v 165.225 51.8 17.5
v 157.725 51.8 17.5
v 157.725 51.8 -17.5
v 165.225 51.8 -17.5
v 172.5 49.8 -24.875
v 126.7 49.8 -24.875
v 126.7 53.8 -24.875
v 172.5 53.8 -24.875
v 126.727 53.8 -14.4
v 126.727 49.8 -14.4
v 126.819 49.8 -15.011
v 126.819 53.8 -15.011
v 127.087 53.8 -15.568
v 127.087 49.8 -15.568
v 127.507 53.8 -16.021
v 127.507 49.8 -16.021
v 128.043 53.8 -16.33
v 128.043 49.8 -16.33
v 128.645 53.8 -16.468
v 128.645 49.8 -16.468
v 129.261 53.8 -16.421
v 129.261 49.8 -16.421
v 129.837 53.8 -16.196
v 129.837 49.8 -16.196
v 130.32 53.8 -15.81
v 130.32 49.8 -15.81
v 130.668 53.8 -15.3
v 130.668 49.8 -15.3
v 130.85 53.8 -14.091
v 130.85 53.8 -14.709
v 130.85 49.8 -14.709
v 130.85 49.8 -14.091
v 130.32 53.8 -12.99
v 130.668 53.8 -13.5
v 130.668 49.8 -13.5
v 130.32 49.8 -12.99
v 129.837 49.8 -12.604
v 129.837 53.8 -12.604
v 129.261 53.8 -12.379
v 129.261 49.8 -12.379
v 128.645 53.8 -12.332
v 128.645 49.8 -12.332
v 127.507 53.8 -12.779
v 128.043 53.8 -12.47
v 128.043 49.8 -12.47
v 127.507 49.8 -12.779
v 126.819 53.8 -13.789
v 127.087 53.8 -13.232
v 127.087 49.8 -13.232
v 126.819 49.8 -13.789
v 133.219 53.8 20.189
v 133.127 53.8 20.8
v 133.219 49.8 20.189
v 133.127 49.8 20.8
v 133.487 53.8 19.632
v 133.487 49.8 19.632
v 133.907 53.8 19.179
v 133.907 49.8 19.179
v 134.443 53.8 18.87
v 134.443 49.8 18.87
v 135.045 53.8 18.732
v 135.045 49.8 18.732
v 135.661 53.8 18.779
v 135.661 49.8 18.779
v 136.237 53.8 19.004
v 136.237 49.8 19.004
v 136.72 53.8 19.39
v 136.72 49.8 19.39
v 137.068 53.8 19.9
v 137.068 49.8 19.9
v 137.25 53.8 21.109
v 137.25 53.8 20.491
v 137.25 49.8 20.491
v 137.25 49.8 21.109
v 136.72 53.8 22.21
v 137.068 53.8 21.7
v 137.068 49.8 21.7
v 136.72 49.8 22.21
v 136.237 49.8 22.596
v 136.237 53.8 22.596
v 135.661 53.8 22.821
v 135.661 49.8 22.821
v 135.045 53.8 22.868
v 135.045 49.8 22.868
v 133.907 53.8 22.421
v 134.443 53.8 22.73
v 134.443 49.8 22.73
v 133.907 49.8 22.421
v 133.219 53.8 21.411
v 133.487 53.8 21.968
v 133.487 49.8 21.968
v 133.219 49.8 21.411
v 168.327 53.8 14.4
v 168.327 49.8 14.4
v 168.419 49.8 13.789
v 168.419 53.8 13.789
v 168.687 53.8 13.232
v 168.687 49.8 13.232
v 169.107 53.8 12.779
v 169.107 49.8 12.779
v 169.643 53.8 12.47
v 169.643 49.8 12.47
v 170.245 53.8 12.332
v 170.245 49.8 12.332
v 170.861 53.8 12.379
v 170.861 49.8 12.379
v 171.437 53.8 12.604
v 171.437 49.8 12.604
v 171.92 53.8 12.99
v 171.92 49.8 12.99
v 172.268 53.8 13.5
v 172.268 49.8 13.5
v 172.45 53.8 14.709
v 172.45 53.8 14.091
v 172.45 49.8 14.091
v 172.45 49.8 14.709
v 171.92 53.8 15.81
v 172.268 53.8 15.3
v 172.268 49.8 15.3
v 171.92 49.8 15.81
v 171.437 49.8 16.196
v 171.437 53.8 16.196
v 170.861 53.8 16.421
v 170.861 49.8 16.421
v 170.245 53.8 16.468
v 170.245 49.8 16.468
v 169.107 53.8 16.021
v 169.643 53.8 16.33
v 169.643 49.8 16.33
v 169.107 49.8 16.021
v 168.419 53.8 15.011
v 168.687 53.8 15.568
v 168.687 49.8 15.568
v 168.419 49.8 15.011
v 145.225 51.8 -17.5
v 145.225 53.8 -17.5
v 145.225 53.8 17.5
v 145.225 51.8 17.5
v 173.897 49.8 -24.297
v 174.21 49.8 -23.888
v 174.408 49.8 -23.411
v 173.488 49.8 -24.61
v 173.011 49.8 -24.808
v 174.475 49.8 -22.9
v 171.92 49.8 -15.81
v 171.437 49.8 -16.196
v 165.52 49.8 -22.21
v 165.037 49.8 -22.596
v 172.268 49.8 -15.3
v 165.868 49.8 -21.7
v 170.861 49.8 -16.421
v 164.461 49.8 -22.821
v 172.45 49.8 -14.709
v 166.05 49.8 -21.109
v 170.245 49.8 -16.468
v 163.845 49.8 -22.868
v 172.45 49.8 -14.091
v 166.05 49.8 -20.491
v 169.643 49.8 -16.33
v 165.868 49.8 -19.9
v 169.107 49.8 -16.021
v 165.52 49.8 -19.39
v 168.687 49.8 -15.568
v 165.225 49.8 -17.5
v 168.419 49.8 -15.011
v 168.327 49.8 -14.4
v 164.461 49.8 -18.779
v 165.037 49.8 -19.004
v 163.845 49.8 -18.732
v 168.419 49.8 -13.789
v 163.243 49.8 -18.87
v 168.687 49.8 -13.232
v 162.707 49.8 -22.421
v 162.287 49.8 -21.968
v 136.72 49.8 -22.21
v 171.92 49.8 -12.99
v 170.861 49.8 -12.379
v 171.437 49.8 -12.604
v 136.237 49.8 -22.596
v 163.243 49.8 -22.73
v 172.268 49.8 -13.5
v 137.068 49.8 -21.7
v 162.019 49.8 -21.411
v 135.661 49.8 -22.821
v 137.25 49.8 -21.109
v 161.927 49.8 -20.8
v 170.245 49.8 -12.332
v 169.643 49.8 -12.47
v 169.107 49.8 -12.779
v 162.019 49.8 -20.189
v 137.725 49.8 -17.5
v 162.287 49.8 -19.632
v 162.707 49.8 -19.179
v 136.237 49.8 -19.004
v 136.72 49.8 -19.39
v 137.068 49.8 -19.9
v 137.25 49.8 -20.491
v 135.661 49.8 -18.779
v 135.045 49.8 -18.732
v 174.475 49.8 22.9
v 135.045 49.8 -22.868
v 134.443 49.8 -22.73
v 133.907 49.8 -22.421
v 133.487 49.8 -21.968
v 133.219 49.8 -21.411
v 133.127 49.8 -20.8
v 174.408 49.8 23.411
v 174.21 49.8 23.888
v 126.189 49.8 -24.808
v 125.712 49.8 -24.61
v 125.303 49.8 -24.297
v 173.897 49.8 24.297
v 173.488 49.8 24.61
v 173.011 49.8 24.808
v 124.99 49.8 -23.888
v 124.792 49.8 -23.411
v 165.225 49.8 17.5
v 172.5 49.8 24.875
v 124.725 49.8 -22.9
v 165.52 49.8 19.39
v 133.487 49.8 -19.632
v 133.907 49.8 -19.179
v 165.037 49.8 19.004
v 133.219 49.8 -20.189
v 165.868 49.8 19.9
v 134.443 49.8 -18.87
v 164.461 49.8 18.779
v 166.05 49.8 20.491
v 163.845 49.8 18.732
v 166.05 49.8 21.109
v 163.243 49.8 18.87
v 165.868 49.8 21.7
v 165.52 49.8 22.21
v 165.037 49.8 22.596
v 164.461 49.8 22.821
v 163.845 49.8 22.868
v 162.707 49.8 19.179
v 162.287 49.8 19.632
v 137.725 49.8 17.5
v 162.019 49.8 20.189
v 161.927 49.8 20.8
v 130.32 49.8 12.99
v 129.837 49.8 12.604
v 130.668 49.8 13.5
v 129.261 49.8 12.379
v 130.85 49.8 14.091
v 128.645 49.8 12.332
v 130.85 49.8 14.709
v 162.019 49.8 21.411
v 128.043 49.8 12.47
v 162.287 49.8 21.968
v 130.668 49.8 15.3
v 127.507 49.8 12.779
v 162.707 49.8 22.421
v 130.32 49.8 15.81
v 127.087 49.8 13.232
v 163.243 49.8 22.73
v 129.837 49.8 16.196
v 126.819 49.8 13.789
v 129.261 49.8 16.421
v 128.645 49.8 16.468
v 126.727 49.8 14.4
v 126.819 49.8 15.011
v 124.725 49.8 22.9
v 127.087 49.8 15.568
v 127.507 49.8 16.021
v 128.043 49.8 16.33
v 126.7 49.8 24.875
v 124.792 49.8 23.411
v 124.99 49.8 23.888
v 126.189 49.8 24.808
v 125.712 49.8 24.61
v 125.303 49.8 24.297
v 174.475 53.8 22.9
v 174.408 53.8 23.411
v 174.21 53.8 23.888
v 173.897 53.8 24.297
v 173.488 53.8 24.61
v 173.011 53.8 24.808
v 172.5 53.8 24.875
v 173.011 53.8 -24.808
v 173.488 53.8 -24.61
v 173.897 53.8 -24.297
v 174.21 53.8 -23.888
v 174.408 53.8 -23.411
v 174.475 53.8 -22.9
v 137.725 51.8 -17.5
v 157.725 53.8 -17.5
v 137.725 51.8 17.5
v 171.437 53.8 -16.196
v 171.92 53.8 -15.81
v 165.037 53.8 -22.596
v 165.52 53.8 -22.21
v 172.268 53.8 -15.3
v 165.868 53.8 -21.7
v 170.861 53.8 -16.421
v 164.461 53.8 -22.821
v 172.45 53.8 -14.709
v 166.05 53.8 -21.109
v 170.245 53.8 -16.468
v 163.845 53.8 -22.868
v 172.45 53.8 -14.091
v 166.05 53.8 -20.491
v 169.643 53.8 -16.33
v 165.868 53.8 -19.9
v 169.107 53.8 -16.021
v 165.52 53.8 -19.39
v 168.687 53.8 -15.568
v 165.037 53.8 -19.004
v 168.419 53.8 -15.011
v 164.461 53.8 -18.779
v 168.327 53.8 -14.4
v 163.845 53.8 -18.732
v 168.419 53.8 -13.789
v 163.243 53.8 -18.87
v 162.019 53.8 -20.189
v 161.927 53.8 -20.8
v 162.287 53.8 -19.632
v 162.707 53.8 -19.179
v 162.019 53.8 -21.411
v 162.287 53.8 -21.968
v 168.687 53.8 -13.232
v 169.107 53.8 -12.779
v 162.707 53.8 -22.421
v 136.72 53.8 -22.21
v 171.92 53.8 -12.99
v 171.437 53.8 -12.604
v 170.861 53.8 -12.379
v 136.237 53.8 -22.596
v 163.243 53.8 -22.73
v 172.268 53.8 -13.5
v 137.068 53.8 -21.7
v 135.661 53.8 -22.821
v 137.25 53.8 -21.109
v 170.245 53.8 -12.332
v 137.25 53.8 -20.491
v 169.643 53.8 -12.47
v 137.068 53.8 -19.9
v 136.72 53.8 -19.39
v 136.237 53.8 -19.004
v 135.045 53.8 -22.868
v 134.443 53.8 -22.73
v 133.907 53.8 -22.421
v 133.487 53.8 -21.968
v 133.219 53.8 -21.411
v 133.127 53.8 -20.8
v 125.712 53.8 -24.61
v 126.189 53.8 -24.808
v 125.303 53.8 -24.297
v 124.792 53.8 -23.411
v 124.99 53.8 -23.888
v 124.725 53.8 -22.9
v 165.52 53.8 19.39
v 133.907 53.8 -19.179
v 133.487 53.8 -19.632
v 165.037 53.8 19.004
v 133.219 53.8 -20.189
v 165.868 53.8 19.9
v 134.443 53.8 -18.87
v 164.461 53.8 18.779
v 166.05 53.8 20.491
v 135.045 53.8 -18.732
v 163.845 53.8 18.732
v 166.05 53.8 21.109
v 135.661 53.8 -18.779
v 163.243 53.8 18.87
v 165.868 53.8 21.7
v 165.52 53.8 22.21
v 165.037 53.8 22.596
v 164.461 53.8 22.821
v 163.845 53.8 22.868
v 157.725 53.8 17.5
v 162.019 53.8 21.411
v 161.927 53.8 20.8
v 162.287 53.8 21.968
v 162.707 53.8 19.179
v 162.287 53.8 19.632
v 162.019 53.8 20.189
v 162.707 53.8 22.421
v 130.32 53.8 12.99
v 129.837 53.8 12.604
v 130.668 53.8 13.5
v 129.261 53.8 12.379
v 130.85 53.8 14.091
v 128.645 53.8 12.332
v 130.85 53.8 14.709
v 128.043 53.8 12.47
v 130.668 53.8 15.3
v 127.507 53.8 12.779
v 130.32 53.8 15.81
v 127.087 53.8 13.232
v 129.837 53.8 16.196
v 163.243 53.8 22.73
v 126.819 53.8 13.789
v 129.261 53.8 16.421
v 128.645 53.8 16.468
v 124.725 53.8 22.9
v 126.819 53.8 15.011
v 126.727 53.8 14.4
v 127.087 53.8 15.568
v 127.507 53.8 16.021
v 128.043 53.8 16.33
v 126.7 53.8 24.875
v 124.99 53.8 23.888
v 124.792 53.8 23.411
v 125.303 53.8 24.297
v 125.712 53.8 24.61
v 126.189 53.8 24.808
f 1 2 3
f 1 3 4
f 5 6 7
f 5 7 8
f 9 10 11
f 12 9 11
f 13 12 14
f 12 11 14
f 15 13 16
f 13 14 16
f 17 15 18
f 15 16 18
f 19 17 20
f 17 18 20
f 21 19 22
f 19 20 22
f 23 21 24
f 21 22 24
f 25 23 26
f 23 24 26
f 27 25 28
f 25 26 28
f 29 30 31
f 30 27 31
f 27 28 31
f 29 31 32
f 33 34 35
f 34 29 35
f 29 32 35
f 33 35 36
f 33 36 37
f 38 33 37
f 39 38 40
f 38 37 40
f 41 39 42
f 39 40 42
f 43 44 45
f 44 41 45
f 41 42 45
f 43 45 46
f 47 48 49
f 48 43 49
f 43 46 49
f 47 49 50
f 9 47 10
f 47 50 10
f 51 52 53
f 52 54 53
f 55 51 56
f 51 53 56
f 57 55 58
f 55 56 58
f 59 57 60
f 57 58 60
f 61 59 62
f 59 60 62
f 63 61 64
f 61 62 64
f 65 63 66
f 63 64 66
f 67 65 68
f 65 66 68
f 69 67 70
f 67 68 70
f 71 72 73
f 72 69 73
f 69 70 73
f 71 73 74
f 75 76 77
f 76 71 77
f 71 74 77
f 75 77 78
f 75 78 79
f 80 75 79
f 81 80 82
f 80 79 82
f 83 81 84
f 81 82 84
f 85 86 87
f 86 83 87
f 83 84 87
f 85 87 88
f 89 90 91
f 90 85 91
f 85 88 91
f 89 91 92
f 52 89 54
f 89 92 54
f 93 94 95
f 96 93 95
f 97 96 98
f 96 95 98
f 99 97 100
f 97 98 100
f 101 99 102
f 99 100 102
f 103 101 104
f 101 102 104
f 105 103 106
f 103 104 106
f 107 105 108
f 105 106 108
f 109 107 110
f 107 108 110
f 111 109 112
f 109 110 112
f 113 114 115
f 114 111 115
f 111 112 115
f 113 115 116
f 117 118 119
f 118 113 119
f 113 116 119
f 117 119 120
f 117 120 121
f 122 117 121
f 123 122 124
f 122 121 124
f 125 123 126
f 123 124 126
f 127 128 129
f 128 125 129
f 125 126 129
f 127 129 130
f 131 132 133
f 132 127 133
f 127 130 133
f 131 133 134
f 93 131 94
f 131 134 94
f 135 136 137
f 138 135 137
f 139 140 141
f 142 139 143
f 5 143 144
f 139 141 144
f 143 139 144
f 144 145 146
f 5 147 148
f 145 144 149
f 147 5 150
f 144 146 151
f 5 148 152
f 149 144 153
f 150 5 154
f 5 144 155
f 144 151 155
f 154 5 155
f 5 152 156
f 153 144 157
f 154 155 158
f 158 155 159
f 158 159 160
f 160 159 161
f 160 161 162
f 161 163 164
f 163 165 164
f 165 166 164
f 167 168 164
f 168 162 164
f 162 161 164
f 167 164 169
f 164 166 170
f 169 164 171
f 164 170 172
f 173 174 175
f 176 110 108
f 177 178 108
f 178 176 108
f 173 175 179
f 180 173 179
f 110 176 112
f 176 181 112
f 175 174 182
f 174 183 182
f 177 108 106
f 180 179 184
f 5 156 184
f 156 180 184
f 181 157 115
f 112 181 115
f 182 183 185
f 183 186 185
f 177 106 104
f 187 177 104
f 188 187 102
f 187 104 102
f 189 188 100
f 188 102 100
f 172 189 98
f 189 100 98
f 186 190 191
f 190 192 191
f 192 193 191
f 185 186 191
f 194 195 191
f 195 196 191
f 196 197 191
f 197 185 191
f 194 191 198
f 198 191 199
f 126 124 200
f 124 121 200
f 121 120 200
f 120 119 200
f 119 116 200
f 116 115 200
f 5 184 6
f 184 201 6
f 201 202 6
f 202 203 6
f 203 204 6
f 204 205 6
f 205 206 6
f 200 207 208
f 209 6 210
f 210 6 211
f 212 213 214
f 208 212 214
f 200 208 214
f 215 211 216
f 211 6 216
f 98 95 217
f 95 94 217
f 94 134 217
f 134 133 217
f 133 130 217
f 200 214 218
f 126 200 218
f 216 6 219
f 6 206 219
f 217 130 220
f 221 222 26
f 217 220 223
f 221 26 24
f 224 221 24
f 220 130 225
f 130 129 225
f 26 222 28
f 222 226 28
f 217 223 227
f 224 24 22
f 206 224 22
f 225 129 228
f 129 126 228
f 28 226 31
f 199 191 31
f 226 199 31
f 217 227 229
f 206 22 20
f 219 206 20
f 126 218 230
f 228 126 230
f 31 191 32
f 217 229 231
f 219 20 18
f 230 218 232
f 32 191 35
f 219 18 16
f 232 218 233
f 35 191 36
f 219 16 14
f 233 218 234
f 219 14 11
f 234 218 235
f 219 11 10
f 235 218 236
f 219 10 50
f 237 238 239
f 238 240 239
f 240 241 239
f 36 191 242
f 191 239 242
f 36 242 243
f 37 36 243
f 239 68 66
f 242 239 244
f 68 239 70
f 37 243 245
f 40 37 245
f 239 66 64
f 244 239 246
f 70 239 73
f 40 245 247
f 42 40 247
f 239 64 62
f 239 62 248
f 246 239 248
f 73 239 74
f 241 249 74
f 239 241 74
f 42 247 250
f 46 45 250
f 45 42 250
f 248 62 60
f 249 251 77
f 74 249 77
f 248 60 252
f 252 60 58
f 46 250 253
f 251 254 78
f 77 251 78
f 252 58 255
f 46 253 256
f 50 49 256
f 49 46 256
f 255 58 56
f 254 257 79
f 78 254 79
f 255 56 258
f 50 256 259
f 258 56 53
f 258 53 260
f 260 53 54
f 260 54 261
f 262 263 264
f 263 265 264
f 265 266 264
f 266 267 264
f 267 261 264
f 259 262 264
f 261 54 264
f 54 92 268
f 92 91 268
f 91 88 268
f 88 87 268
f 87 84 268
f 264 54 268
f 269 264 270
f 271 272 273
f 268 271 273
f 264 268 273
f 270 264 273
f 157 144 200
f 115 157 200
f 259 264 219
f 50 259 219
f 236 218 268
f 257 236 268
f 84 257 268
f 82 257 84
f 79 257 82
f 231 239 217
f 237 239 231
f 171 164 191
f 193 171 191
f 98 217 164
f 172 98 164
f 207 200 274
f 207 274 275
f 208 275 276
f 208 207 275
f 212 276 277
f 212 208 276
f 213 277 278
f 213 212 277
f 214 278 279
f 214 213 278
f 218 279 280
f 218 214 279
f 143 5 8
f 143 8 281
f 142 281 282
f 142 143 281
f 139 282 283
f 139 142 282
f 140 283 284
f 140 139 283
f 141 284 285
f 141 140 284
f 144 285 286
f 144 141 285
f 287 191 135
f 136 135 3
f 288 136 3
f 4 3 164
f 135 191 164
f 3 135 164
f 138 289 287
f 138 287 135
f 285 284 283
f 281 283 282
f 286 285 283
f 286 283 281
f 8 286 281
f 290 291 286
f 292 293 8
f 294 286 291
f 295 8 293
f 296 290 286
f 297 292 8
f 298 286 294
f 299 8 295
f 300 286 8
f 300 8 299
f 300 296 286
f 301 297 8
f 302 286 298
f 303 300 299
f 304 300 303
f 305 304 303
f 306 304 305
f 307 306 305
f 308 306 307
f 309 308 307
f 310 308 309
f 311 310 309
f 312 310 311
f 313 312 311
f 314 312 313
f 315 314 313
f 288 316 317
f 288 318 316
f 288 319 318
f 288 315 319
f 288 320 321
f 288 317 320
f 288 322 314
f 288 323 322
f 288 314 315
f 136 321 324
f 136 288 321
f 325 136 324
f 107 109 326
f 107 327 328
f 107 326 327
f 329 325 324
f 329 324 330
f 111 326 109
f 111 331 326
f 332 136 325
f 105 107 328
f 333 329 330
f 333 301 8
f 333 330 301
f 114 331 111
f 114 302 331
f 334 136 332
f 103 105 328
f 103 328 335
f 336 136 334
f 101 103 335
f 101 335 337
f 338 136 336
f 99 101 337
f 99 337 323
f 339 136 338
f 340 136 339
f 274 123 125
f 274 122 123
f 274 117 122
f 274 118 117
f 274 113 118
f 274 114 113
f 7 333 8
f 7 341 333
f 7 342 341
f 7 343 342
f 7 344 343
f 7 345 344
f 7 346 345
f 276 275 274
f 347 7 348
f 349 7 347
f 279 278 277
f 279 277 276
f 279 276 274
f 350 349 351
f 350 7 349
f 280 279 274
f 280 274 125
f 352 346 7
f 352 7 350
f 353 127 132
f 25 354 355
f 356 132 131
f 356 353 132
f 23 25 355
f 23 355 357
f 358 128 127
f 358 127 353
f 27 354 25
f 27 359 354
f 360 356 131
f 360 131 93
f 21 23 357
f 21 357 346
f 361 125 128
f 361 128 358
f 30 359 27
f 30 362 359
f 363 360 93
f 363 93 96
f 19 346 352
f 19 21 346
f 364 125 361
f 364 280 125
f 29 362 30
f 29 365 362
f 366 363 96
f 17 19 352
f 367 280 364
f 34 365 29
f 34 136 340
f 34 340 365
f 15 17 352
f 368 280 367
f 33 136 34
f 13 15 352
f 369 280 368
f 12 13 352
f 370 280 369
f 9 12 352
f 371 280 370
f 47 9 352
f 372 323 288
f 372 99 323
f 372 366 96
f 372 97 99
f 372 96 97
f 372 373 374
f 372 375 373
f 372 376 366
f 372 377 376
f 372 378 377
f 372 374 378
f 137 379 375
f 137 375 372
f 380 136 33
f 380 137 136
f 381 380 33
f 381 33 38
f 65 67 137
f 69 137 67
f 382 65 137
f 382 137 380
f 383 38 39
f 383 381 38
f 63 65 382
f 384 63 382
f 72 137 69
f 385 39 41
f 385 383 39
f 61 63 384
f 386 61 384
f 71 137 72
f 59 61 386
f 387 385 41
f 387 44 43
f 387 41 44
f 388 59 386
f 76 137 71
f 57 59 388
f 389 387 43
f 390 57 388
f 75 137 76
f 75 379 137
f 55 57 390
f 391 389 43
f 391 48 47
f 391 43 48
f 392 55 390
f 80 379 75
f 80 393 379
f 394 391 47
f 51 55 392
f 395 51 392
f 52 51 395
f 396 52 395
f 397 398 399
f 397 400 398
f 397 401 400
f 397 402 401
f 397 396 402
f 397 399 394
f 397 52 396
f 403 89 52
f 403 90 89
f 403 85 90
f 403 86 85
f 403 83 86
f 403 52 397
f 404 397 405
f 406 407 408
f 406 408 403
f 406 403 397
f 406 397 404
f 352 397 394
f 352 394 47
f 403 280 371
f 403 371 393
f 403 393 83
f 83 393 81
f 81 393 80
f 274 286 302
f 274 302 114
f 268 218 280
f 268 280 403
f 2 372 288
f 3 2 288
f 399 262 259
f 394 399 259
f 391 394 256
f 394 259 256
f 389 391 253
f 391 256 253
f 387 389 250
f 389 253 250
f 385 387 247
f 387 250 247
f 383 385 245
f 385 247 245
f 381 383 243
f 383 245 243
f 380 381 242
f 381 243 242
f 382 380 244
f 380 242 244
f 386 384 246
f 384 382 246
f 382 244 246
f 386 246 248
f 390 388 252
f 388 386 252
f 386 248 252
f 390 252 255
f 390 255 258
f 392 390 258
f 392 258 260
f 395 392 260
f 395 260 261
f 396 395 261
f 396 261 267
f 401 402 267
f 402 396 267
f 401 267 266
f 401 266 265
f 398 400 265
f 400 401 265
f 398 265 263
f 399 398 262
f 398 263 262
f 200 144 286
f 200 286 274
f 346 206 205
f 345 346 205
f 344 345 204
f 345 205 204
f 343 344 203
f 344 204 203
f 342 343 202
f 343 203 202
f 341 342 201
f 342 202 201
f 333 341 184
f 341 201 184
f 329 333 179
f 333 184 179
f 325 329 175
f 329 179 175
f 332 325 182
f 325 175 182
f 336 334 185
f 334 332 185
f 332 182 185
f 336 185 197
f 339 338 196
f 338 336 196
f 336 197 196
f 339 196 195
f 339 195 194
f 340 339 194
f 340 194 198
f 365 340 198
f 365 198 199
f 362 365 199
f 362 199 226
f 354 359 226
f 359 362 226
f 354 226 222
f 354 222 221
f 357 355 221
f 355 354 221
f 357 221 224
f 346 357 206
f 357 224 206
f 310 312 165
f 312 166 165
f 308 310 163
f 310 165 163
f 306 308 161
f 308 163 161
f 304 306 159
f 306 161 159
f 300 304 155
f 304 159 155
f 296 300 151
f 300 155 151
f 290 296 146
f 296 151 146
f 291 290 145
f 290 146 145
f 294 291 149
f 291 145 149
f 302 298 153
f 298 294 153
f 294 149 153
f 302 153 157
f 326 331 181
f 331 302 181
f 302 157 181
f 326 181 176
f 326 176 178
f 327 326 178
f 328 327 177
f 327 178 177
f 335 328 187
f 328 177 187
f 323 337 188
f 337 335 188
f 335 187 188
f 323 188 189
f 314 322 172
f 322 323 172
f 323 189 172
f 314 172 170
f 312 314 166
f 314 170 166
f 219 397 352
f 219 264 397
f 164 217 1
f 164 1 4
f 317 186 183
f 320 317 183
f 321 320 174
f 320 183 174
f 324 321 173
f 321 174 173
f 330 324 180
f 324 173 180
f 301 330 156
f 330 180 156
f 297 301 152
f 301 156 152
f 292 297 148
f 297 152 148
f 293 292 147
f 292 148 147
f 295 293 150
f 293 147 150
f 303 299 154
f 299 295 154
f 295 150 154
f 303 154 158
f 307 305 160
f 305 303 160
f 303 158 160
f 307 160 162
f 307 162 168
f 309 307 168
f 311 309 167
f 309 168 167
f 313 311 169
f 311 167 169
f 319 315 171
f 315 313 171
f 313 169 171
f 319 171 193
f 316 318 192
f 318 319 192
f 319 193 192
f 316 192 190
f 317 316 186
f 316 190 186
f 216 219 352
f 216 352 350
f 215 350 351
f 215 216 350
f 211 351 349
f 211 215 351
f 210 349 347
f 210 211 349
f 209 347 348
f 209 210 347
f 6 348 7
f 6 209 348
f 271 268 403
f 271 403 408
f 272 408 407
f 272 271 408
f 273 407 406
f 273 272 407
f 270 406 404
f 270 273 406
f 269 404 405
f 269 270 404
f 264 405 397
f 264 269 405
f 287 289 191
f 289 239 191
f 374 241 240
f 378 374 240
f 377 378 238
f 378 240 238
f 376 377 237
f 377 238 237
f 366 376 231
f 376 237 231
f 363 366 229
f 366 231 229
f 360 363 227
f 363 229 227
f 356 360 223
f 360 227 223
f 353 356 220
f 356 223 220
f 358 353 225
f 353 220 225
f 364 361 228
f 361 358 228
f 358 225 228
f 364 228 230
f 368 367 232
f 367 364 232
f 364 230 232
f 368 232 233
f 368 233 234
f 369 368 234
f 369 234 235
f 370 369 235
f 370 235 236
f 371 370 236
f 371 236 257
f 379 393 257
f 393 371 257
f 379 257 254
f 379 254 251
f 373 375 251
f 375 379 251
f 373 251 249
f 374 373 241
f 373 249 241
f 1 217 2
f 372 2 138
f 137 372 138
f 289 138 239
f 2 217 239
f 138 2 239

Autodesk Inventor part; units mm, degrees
ref_plane "YZ Plane" through (0, 0, 0) normal (1, 0, 0) x (0, 1, 0)
ref_plane "XZ Plane" through (0, 0, 0) normal (0, 1, 0) x (-1, 0, 0)
sketch "Sketch1" plane through (0, 0, 0) normal (0, 1, 0) x (-1, 0, 0)
  line L0 (-155.225, -15) -> (-155.225, 15) projected
  line L1 (-155.225, 15) -> (-147.725, 15) projected
  line L2 (-147.725, 15) -> (-147.725, -15) projected
  line L3 (-147.725, -15) -> (-155.225, -15) projected
  circle A0 centre (-171.5, -21.9) radius 1.875 projected
  circle A1 centre (-127.7, 21.9) radius 1.875 projected
  circle A2 centre (-127.7, -21.9) radius 1.875 projected
  circle A3 centre (-171.5, 21.9) radius 1.875 projected
  circle A4 centre (-135.2, 20.8) radius 2.0734 projected
  circle A5 centre (-164, -20.8) radius 2.0734 projected
  circle A6 centre (-135.2, -20.8) radius 2.0734 projected
  circle A7 centre (-128.8, -14.4) radius 2.0734 projected
  circle A8 centre (-128.8, 14.4) radius 2.0734 projected
  circle A9 centre (-164, 20.8) radius 2.0734 projected
  circle A10 centre (-170.4, -14.4) radius 2.0734 projected
  circle A11 centre (-170.4, 14.4) radius 2.0734 projected
  line L4 (-172.5, 24.875) -> (-126.7, 24.875) projected
  arc A12 (-172.5, 24.875) -> (-174.475, 22.9) centre (-172.5, 22.9) ccw projected
  line L5 (-174.475, -22.9) -> (-174.475, 22.9) projected
  arc A13 (-174.475, -22.9) -> (-172.5, -24.875) centre (-172.5, -22.9) ccw projected
  line L6 (-126.7, -24.875) -> (-172.5, -24.875) projected
  arc A14 (-126.7, -24.875) -> (-124.725, -22.9) centre (-126.7, -22.9) ccw projected
  line L7 (-124.725, 22.9) -> (-124.725, -22.9) projected
  arc A15 (-124.725, 22.9) -> (-126.7, 24.875) centre (-126.7, 22.9) ccw projected
  point P0 (0, 0)
ref_plane "Work Plane1" through (124.725, 49.8, -24.875) normal (0, 1, 0) x (0, 0, 1)
extrude "Extrusion1" add sketch "Sketch1" along normal blind 4 from surface at 49.8 contours A0 | A1 | A2 | A3 | L4 A15 L7 A14 L6 A13 L5 A12
sketch "Sketch2" plane through (126.7, 53.8, -24.875) normal (0, 1, 0) x (1, 0, 0)
  line L0 (28.525, -9.875) -> (21.025, -9.875) projected
  line L1 (28.525, -39.875) -> (28.525, -9.875) projected
  line L2 (21.025, -39.875) -> (28.525, -39.875) projected
  line L3 (21.025, -9.875) -> (21.025, -39.875) projected
  circle A0 centre (8.5, -45.675) radius 2.0734 projected
  circle A1 centre (37.3, -4.075) radius 2.0734 projected
  circle A2 centre (8.5, -4.075) radius 2.0734 projected
  circle A3 centre (2.1, -10.475) radius 2.0734 projected
  circle A4 centre (2.1, -39.275) radius 2.0734 projected
  circle A5 centre (37.3, -45.675) radius 2.0734 projected
  circle A6 centre (43.7, -10.475) radius 2.0734 projected
  circle A7 centre (43.7, -39.275) radius 2.0734 projected
  arc A8 (47.775, -1.975) -> (45.8, 0) centre (45.8, -1.975) ccw projected
  line L4 (0, 0) -> (45.8, 0) projected
  arc A9 (0, 0) -> (-1.975, -1.975) centre (0, -1.975) ccw projected
  line L5 (-1.975, -47.775) -> (-1.975, -1.975) projected
  arc A10 (-1.975, -47.775) -> (0, -49.75) centre (0, -47.775) ccw projected
  line L6 (45.8, -49.75) -> (0, -49.75) projected
  arc A11 (45.8, -49.75) -> (47.775, -47.775) centre (45.8, -47.775) ccw projected
  line L7 (47.775, -1.975) -> (47.775, -47.775) projected
  line L8 (18.525, -42.375) -> (31.025, -42.375)
  line L9 (31.025, -42.375) -> (31.025, -7.375)
  line L10 (31.025, -7.375) -> (18.525, -7.375)
  line L11 (18.525, -7.375) -> (18.525, -42.375)
  line L12 (45.8, 0) -> (50.05, 0)
  line L13 (50.05, 0) -> (50.05, -49.75)
  line L14 (50.05, -49.75) -> (45.8, -49.75)
  line L15 (45.8, -49.75) -> (45.8, 0)
  line L16 (50.05, -49.75) -> (47.925, -49.75)
  line L17 (47.925, -49.75) -> (47.925, 0)
  line L18 (47.925, 0) -> (50.05, 0)
  line L19 (50.05, 0) -> (50.05, -49.75)
  arc A12 (45.8, -49.875) -> (47.9, -47.775) centre (45.8, -47.775) ccw
  line L20 (45.8, -49.875) -> (0, -49.875)
  arc A13 (-2.1, -47.775) -> (0, -49.875) centre (0, -47.775) ccw
  line L21 (-2.1, -47.775) -> (-2.1, -1.975)
  arc A14 (0, 0.125) -> (-2.1, -1.975) centre (0, -1.975) ccw
  line L22 (0, 0.125) -> (45.8, 0.125)
  arc A15 (47.9, -1.975) -> (45.8, 0.125) centre (45.8, -1.975) ccw
  line L23 (47.9, -1.975) -> (47.9, -47.775)
  line L24 (18.525, -42.375) -> (11.025, -42.375)
  line L25 (11.025, -42.375) -> (11.025, -7.375)
  line L26 (11.025, -7.375) -> (18.525, -7.375)
  line L27 (18.525, -7.375) -> (18.525, -42.375)
  line L28 (31.025, -42.375) -> (38.525, -42.375)
  line L29 (38.525, -42.375) -> (38.525, -7.375)
  line L30 (38.525, -7.375) -> (31.025, -7.375)
  line L31 (31.025, -7.375) -> (31.025, -42.375)
  point P0 (-126.7, -24.875)
  point P1 (47.925, -49.75)
  point P2 (46.5137, -49.75)
  point P3 (46.5137, 0)
  point P4 (31.025, -7.375)
  point P5 (18.525, -7.375)
  dimension "d2" = 2.5
  dimension "d3" = 4.25
  dimension "d4" = 2.125
  dimension "d15" = 0.125
  dimension "d16" = 7.5
  dimension "d17" = 7.5
extrude "Extrusion2" cut sketch "Sketch2" against normal up to surface (4 mm away) contours L11 L10 L9 L8
extrude "Extrusion3" [suppressed]
extrude "Extrusion4" [suppressed]
fillet "Fillet1" [suppressed]
sketch "Sketch3" plane through (176.75, 51.8, 22.875) normal (1, 0, 0) x (0, 0, -1)
  line L0 (7.875, -21.425) -> (7.875, -28.925) projected
  line L1 (7.875, -28.925) -> (37.875, -28.925) projected
  line L2 (37.875, -28.925) -> (37.875, -21.425) projected
  line L3 (37.875, -21.425) -> (7.875, -21.425) projected
  line L4 (5.825, -9.7) -> (39.925, -9.7) projected
  line L5 (39.925, -44.1) -> (39.925, -9.7) projected
  line L6 (5.825, -44.1) -> (39.925, -44.1) projected
  line L7 (5.825, -9.7) -> (5.825, -44.1) projected
  line L8 (2.875, -16.425) -> (2.875, -33.925)
  line L9 (2.875, -33.925) -> (42.875, -33.925)
  line L10 (42.875, -33.925) -> (42.875, -16.425)
  line L11 (42.875, -16.425) -> (2.875, -16.425)
  point P0 (22.875, -51.8)
  dimension "d12" = 5
extrude "Extrusion5" [suppressed]
extrude "Extrusion6" cut sketch "Sketch2" along normal blind 2 from surface at -4 contours L24 L25 L26 L11 | L9 L30 L29 L28
properties part number "Lens Top Light Cover"
